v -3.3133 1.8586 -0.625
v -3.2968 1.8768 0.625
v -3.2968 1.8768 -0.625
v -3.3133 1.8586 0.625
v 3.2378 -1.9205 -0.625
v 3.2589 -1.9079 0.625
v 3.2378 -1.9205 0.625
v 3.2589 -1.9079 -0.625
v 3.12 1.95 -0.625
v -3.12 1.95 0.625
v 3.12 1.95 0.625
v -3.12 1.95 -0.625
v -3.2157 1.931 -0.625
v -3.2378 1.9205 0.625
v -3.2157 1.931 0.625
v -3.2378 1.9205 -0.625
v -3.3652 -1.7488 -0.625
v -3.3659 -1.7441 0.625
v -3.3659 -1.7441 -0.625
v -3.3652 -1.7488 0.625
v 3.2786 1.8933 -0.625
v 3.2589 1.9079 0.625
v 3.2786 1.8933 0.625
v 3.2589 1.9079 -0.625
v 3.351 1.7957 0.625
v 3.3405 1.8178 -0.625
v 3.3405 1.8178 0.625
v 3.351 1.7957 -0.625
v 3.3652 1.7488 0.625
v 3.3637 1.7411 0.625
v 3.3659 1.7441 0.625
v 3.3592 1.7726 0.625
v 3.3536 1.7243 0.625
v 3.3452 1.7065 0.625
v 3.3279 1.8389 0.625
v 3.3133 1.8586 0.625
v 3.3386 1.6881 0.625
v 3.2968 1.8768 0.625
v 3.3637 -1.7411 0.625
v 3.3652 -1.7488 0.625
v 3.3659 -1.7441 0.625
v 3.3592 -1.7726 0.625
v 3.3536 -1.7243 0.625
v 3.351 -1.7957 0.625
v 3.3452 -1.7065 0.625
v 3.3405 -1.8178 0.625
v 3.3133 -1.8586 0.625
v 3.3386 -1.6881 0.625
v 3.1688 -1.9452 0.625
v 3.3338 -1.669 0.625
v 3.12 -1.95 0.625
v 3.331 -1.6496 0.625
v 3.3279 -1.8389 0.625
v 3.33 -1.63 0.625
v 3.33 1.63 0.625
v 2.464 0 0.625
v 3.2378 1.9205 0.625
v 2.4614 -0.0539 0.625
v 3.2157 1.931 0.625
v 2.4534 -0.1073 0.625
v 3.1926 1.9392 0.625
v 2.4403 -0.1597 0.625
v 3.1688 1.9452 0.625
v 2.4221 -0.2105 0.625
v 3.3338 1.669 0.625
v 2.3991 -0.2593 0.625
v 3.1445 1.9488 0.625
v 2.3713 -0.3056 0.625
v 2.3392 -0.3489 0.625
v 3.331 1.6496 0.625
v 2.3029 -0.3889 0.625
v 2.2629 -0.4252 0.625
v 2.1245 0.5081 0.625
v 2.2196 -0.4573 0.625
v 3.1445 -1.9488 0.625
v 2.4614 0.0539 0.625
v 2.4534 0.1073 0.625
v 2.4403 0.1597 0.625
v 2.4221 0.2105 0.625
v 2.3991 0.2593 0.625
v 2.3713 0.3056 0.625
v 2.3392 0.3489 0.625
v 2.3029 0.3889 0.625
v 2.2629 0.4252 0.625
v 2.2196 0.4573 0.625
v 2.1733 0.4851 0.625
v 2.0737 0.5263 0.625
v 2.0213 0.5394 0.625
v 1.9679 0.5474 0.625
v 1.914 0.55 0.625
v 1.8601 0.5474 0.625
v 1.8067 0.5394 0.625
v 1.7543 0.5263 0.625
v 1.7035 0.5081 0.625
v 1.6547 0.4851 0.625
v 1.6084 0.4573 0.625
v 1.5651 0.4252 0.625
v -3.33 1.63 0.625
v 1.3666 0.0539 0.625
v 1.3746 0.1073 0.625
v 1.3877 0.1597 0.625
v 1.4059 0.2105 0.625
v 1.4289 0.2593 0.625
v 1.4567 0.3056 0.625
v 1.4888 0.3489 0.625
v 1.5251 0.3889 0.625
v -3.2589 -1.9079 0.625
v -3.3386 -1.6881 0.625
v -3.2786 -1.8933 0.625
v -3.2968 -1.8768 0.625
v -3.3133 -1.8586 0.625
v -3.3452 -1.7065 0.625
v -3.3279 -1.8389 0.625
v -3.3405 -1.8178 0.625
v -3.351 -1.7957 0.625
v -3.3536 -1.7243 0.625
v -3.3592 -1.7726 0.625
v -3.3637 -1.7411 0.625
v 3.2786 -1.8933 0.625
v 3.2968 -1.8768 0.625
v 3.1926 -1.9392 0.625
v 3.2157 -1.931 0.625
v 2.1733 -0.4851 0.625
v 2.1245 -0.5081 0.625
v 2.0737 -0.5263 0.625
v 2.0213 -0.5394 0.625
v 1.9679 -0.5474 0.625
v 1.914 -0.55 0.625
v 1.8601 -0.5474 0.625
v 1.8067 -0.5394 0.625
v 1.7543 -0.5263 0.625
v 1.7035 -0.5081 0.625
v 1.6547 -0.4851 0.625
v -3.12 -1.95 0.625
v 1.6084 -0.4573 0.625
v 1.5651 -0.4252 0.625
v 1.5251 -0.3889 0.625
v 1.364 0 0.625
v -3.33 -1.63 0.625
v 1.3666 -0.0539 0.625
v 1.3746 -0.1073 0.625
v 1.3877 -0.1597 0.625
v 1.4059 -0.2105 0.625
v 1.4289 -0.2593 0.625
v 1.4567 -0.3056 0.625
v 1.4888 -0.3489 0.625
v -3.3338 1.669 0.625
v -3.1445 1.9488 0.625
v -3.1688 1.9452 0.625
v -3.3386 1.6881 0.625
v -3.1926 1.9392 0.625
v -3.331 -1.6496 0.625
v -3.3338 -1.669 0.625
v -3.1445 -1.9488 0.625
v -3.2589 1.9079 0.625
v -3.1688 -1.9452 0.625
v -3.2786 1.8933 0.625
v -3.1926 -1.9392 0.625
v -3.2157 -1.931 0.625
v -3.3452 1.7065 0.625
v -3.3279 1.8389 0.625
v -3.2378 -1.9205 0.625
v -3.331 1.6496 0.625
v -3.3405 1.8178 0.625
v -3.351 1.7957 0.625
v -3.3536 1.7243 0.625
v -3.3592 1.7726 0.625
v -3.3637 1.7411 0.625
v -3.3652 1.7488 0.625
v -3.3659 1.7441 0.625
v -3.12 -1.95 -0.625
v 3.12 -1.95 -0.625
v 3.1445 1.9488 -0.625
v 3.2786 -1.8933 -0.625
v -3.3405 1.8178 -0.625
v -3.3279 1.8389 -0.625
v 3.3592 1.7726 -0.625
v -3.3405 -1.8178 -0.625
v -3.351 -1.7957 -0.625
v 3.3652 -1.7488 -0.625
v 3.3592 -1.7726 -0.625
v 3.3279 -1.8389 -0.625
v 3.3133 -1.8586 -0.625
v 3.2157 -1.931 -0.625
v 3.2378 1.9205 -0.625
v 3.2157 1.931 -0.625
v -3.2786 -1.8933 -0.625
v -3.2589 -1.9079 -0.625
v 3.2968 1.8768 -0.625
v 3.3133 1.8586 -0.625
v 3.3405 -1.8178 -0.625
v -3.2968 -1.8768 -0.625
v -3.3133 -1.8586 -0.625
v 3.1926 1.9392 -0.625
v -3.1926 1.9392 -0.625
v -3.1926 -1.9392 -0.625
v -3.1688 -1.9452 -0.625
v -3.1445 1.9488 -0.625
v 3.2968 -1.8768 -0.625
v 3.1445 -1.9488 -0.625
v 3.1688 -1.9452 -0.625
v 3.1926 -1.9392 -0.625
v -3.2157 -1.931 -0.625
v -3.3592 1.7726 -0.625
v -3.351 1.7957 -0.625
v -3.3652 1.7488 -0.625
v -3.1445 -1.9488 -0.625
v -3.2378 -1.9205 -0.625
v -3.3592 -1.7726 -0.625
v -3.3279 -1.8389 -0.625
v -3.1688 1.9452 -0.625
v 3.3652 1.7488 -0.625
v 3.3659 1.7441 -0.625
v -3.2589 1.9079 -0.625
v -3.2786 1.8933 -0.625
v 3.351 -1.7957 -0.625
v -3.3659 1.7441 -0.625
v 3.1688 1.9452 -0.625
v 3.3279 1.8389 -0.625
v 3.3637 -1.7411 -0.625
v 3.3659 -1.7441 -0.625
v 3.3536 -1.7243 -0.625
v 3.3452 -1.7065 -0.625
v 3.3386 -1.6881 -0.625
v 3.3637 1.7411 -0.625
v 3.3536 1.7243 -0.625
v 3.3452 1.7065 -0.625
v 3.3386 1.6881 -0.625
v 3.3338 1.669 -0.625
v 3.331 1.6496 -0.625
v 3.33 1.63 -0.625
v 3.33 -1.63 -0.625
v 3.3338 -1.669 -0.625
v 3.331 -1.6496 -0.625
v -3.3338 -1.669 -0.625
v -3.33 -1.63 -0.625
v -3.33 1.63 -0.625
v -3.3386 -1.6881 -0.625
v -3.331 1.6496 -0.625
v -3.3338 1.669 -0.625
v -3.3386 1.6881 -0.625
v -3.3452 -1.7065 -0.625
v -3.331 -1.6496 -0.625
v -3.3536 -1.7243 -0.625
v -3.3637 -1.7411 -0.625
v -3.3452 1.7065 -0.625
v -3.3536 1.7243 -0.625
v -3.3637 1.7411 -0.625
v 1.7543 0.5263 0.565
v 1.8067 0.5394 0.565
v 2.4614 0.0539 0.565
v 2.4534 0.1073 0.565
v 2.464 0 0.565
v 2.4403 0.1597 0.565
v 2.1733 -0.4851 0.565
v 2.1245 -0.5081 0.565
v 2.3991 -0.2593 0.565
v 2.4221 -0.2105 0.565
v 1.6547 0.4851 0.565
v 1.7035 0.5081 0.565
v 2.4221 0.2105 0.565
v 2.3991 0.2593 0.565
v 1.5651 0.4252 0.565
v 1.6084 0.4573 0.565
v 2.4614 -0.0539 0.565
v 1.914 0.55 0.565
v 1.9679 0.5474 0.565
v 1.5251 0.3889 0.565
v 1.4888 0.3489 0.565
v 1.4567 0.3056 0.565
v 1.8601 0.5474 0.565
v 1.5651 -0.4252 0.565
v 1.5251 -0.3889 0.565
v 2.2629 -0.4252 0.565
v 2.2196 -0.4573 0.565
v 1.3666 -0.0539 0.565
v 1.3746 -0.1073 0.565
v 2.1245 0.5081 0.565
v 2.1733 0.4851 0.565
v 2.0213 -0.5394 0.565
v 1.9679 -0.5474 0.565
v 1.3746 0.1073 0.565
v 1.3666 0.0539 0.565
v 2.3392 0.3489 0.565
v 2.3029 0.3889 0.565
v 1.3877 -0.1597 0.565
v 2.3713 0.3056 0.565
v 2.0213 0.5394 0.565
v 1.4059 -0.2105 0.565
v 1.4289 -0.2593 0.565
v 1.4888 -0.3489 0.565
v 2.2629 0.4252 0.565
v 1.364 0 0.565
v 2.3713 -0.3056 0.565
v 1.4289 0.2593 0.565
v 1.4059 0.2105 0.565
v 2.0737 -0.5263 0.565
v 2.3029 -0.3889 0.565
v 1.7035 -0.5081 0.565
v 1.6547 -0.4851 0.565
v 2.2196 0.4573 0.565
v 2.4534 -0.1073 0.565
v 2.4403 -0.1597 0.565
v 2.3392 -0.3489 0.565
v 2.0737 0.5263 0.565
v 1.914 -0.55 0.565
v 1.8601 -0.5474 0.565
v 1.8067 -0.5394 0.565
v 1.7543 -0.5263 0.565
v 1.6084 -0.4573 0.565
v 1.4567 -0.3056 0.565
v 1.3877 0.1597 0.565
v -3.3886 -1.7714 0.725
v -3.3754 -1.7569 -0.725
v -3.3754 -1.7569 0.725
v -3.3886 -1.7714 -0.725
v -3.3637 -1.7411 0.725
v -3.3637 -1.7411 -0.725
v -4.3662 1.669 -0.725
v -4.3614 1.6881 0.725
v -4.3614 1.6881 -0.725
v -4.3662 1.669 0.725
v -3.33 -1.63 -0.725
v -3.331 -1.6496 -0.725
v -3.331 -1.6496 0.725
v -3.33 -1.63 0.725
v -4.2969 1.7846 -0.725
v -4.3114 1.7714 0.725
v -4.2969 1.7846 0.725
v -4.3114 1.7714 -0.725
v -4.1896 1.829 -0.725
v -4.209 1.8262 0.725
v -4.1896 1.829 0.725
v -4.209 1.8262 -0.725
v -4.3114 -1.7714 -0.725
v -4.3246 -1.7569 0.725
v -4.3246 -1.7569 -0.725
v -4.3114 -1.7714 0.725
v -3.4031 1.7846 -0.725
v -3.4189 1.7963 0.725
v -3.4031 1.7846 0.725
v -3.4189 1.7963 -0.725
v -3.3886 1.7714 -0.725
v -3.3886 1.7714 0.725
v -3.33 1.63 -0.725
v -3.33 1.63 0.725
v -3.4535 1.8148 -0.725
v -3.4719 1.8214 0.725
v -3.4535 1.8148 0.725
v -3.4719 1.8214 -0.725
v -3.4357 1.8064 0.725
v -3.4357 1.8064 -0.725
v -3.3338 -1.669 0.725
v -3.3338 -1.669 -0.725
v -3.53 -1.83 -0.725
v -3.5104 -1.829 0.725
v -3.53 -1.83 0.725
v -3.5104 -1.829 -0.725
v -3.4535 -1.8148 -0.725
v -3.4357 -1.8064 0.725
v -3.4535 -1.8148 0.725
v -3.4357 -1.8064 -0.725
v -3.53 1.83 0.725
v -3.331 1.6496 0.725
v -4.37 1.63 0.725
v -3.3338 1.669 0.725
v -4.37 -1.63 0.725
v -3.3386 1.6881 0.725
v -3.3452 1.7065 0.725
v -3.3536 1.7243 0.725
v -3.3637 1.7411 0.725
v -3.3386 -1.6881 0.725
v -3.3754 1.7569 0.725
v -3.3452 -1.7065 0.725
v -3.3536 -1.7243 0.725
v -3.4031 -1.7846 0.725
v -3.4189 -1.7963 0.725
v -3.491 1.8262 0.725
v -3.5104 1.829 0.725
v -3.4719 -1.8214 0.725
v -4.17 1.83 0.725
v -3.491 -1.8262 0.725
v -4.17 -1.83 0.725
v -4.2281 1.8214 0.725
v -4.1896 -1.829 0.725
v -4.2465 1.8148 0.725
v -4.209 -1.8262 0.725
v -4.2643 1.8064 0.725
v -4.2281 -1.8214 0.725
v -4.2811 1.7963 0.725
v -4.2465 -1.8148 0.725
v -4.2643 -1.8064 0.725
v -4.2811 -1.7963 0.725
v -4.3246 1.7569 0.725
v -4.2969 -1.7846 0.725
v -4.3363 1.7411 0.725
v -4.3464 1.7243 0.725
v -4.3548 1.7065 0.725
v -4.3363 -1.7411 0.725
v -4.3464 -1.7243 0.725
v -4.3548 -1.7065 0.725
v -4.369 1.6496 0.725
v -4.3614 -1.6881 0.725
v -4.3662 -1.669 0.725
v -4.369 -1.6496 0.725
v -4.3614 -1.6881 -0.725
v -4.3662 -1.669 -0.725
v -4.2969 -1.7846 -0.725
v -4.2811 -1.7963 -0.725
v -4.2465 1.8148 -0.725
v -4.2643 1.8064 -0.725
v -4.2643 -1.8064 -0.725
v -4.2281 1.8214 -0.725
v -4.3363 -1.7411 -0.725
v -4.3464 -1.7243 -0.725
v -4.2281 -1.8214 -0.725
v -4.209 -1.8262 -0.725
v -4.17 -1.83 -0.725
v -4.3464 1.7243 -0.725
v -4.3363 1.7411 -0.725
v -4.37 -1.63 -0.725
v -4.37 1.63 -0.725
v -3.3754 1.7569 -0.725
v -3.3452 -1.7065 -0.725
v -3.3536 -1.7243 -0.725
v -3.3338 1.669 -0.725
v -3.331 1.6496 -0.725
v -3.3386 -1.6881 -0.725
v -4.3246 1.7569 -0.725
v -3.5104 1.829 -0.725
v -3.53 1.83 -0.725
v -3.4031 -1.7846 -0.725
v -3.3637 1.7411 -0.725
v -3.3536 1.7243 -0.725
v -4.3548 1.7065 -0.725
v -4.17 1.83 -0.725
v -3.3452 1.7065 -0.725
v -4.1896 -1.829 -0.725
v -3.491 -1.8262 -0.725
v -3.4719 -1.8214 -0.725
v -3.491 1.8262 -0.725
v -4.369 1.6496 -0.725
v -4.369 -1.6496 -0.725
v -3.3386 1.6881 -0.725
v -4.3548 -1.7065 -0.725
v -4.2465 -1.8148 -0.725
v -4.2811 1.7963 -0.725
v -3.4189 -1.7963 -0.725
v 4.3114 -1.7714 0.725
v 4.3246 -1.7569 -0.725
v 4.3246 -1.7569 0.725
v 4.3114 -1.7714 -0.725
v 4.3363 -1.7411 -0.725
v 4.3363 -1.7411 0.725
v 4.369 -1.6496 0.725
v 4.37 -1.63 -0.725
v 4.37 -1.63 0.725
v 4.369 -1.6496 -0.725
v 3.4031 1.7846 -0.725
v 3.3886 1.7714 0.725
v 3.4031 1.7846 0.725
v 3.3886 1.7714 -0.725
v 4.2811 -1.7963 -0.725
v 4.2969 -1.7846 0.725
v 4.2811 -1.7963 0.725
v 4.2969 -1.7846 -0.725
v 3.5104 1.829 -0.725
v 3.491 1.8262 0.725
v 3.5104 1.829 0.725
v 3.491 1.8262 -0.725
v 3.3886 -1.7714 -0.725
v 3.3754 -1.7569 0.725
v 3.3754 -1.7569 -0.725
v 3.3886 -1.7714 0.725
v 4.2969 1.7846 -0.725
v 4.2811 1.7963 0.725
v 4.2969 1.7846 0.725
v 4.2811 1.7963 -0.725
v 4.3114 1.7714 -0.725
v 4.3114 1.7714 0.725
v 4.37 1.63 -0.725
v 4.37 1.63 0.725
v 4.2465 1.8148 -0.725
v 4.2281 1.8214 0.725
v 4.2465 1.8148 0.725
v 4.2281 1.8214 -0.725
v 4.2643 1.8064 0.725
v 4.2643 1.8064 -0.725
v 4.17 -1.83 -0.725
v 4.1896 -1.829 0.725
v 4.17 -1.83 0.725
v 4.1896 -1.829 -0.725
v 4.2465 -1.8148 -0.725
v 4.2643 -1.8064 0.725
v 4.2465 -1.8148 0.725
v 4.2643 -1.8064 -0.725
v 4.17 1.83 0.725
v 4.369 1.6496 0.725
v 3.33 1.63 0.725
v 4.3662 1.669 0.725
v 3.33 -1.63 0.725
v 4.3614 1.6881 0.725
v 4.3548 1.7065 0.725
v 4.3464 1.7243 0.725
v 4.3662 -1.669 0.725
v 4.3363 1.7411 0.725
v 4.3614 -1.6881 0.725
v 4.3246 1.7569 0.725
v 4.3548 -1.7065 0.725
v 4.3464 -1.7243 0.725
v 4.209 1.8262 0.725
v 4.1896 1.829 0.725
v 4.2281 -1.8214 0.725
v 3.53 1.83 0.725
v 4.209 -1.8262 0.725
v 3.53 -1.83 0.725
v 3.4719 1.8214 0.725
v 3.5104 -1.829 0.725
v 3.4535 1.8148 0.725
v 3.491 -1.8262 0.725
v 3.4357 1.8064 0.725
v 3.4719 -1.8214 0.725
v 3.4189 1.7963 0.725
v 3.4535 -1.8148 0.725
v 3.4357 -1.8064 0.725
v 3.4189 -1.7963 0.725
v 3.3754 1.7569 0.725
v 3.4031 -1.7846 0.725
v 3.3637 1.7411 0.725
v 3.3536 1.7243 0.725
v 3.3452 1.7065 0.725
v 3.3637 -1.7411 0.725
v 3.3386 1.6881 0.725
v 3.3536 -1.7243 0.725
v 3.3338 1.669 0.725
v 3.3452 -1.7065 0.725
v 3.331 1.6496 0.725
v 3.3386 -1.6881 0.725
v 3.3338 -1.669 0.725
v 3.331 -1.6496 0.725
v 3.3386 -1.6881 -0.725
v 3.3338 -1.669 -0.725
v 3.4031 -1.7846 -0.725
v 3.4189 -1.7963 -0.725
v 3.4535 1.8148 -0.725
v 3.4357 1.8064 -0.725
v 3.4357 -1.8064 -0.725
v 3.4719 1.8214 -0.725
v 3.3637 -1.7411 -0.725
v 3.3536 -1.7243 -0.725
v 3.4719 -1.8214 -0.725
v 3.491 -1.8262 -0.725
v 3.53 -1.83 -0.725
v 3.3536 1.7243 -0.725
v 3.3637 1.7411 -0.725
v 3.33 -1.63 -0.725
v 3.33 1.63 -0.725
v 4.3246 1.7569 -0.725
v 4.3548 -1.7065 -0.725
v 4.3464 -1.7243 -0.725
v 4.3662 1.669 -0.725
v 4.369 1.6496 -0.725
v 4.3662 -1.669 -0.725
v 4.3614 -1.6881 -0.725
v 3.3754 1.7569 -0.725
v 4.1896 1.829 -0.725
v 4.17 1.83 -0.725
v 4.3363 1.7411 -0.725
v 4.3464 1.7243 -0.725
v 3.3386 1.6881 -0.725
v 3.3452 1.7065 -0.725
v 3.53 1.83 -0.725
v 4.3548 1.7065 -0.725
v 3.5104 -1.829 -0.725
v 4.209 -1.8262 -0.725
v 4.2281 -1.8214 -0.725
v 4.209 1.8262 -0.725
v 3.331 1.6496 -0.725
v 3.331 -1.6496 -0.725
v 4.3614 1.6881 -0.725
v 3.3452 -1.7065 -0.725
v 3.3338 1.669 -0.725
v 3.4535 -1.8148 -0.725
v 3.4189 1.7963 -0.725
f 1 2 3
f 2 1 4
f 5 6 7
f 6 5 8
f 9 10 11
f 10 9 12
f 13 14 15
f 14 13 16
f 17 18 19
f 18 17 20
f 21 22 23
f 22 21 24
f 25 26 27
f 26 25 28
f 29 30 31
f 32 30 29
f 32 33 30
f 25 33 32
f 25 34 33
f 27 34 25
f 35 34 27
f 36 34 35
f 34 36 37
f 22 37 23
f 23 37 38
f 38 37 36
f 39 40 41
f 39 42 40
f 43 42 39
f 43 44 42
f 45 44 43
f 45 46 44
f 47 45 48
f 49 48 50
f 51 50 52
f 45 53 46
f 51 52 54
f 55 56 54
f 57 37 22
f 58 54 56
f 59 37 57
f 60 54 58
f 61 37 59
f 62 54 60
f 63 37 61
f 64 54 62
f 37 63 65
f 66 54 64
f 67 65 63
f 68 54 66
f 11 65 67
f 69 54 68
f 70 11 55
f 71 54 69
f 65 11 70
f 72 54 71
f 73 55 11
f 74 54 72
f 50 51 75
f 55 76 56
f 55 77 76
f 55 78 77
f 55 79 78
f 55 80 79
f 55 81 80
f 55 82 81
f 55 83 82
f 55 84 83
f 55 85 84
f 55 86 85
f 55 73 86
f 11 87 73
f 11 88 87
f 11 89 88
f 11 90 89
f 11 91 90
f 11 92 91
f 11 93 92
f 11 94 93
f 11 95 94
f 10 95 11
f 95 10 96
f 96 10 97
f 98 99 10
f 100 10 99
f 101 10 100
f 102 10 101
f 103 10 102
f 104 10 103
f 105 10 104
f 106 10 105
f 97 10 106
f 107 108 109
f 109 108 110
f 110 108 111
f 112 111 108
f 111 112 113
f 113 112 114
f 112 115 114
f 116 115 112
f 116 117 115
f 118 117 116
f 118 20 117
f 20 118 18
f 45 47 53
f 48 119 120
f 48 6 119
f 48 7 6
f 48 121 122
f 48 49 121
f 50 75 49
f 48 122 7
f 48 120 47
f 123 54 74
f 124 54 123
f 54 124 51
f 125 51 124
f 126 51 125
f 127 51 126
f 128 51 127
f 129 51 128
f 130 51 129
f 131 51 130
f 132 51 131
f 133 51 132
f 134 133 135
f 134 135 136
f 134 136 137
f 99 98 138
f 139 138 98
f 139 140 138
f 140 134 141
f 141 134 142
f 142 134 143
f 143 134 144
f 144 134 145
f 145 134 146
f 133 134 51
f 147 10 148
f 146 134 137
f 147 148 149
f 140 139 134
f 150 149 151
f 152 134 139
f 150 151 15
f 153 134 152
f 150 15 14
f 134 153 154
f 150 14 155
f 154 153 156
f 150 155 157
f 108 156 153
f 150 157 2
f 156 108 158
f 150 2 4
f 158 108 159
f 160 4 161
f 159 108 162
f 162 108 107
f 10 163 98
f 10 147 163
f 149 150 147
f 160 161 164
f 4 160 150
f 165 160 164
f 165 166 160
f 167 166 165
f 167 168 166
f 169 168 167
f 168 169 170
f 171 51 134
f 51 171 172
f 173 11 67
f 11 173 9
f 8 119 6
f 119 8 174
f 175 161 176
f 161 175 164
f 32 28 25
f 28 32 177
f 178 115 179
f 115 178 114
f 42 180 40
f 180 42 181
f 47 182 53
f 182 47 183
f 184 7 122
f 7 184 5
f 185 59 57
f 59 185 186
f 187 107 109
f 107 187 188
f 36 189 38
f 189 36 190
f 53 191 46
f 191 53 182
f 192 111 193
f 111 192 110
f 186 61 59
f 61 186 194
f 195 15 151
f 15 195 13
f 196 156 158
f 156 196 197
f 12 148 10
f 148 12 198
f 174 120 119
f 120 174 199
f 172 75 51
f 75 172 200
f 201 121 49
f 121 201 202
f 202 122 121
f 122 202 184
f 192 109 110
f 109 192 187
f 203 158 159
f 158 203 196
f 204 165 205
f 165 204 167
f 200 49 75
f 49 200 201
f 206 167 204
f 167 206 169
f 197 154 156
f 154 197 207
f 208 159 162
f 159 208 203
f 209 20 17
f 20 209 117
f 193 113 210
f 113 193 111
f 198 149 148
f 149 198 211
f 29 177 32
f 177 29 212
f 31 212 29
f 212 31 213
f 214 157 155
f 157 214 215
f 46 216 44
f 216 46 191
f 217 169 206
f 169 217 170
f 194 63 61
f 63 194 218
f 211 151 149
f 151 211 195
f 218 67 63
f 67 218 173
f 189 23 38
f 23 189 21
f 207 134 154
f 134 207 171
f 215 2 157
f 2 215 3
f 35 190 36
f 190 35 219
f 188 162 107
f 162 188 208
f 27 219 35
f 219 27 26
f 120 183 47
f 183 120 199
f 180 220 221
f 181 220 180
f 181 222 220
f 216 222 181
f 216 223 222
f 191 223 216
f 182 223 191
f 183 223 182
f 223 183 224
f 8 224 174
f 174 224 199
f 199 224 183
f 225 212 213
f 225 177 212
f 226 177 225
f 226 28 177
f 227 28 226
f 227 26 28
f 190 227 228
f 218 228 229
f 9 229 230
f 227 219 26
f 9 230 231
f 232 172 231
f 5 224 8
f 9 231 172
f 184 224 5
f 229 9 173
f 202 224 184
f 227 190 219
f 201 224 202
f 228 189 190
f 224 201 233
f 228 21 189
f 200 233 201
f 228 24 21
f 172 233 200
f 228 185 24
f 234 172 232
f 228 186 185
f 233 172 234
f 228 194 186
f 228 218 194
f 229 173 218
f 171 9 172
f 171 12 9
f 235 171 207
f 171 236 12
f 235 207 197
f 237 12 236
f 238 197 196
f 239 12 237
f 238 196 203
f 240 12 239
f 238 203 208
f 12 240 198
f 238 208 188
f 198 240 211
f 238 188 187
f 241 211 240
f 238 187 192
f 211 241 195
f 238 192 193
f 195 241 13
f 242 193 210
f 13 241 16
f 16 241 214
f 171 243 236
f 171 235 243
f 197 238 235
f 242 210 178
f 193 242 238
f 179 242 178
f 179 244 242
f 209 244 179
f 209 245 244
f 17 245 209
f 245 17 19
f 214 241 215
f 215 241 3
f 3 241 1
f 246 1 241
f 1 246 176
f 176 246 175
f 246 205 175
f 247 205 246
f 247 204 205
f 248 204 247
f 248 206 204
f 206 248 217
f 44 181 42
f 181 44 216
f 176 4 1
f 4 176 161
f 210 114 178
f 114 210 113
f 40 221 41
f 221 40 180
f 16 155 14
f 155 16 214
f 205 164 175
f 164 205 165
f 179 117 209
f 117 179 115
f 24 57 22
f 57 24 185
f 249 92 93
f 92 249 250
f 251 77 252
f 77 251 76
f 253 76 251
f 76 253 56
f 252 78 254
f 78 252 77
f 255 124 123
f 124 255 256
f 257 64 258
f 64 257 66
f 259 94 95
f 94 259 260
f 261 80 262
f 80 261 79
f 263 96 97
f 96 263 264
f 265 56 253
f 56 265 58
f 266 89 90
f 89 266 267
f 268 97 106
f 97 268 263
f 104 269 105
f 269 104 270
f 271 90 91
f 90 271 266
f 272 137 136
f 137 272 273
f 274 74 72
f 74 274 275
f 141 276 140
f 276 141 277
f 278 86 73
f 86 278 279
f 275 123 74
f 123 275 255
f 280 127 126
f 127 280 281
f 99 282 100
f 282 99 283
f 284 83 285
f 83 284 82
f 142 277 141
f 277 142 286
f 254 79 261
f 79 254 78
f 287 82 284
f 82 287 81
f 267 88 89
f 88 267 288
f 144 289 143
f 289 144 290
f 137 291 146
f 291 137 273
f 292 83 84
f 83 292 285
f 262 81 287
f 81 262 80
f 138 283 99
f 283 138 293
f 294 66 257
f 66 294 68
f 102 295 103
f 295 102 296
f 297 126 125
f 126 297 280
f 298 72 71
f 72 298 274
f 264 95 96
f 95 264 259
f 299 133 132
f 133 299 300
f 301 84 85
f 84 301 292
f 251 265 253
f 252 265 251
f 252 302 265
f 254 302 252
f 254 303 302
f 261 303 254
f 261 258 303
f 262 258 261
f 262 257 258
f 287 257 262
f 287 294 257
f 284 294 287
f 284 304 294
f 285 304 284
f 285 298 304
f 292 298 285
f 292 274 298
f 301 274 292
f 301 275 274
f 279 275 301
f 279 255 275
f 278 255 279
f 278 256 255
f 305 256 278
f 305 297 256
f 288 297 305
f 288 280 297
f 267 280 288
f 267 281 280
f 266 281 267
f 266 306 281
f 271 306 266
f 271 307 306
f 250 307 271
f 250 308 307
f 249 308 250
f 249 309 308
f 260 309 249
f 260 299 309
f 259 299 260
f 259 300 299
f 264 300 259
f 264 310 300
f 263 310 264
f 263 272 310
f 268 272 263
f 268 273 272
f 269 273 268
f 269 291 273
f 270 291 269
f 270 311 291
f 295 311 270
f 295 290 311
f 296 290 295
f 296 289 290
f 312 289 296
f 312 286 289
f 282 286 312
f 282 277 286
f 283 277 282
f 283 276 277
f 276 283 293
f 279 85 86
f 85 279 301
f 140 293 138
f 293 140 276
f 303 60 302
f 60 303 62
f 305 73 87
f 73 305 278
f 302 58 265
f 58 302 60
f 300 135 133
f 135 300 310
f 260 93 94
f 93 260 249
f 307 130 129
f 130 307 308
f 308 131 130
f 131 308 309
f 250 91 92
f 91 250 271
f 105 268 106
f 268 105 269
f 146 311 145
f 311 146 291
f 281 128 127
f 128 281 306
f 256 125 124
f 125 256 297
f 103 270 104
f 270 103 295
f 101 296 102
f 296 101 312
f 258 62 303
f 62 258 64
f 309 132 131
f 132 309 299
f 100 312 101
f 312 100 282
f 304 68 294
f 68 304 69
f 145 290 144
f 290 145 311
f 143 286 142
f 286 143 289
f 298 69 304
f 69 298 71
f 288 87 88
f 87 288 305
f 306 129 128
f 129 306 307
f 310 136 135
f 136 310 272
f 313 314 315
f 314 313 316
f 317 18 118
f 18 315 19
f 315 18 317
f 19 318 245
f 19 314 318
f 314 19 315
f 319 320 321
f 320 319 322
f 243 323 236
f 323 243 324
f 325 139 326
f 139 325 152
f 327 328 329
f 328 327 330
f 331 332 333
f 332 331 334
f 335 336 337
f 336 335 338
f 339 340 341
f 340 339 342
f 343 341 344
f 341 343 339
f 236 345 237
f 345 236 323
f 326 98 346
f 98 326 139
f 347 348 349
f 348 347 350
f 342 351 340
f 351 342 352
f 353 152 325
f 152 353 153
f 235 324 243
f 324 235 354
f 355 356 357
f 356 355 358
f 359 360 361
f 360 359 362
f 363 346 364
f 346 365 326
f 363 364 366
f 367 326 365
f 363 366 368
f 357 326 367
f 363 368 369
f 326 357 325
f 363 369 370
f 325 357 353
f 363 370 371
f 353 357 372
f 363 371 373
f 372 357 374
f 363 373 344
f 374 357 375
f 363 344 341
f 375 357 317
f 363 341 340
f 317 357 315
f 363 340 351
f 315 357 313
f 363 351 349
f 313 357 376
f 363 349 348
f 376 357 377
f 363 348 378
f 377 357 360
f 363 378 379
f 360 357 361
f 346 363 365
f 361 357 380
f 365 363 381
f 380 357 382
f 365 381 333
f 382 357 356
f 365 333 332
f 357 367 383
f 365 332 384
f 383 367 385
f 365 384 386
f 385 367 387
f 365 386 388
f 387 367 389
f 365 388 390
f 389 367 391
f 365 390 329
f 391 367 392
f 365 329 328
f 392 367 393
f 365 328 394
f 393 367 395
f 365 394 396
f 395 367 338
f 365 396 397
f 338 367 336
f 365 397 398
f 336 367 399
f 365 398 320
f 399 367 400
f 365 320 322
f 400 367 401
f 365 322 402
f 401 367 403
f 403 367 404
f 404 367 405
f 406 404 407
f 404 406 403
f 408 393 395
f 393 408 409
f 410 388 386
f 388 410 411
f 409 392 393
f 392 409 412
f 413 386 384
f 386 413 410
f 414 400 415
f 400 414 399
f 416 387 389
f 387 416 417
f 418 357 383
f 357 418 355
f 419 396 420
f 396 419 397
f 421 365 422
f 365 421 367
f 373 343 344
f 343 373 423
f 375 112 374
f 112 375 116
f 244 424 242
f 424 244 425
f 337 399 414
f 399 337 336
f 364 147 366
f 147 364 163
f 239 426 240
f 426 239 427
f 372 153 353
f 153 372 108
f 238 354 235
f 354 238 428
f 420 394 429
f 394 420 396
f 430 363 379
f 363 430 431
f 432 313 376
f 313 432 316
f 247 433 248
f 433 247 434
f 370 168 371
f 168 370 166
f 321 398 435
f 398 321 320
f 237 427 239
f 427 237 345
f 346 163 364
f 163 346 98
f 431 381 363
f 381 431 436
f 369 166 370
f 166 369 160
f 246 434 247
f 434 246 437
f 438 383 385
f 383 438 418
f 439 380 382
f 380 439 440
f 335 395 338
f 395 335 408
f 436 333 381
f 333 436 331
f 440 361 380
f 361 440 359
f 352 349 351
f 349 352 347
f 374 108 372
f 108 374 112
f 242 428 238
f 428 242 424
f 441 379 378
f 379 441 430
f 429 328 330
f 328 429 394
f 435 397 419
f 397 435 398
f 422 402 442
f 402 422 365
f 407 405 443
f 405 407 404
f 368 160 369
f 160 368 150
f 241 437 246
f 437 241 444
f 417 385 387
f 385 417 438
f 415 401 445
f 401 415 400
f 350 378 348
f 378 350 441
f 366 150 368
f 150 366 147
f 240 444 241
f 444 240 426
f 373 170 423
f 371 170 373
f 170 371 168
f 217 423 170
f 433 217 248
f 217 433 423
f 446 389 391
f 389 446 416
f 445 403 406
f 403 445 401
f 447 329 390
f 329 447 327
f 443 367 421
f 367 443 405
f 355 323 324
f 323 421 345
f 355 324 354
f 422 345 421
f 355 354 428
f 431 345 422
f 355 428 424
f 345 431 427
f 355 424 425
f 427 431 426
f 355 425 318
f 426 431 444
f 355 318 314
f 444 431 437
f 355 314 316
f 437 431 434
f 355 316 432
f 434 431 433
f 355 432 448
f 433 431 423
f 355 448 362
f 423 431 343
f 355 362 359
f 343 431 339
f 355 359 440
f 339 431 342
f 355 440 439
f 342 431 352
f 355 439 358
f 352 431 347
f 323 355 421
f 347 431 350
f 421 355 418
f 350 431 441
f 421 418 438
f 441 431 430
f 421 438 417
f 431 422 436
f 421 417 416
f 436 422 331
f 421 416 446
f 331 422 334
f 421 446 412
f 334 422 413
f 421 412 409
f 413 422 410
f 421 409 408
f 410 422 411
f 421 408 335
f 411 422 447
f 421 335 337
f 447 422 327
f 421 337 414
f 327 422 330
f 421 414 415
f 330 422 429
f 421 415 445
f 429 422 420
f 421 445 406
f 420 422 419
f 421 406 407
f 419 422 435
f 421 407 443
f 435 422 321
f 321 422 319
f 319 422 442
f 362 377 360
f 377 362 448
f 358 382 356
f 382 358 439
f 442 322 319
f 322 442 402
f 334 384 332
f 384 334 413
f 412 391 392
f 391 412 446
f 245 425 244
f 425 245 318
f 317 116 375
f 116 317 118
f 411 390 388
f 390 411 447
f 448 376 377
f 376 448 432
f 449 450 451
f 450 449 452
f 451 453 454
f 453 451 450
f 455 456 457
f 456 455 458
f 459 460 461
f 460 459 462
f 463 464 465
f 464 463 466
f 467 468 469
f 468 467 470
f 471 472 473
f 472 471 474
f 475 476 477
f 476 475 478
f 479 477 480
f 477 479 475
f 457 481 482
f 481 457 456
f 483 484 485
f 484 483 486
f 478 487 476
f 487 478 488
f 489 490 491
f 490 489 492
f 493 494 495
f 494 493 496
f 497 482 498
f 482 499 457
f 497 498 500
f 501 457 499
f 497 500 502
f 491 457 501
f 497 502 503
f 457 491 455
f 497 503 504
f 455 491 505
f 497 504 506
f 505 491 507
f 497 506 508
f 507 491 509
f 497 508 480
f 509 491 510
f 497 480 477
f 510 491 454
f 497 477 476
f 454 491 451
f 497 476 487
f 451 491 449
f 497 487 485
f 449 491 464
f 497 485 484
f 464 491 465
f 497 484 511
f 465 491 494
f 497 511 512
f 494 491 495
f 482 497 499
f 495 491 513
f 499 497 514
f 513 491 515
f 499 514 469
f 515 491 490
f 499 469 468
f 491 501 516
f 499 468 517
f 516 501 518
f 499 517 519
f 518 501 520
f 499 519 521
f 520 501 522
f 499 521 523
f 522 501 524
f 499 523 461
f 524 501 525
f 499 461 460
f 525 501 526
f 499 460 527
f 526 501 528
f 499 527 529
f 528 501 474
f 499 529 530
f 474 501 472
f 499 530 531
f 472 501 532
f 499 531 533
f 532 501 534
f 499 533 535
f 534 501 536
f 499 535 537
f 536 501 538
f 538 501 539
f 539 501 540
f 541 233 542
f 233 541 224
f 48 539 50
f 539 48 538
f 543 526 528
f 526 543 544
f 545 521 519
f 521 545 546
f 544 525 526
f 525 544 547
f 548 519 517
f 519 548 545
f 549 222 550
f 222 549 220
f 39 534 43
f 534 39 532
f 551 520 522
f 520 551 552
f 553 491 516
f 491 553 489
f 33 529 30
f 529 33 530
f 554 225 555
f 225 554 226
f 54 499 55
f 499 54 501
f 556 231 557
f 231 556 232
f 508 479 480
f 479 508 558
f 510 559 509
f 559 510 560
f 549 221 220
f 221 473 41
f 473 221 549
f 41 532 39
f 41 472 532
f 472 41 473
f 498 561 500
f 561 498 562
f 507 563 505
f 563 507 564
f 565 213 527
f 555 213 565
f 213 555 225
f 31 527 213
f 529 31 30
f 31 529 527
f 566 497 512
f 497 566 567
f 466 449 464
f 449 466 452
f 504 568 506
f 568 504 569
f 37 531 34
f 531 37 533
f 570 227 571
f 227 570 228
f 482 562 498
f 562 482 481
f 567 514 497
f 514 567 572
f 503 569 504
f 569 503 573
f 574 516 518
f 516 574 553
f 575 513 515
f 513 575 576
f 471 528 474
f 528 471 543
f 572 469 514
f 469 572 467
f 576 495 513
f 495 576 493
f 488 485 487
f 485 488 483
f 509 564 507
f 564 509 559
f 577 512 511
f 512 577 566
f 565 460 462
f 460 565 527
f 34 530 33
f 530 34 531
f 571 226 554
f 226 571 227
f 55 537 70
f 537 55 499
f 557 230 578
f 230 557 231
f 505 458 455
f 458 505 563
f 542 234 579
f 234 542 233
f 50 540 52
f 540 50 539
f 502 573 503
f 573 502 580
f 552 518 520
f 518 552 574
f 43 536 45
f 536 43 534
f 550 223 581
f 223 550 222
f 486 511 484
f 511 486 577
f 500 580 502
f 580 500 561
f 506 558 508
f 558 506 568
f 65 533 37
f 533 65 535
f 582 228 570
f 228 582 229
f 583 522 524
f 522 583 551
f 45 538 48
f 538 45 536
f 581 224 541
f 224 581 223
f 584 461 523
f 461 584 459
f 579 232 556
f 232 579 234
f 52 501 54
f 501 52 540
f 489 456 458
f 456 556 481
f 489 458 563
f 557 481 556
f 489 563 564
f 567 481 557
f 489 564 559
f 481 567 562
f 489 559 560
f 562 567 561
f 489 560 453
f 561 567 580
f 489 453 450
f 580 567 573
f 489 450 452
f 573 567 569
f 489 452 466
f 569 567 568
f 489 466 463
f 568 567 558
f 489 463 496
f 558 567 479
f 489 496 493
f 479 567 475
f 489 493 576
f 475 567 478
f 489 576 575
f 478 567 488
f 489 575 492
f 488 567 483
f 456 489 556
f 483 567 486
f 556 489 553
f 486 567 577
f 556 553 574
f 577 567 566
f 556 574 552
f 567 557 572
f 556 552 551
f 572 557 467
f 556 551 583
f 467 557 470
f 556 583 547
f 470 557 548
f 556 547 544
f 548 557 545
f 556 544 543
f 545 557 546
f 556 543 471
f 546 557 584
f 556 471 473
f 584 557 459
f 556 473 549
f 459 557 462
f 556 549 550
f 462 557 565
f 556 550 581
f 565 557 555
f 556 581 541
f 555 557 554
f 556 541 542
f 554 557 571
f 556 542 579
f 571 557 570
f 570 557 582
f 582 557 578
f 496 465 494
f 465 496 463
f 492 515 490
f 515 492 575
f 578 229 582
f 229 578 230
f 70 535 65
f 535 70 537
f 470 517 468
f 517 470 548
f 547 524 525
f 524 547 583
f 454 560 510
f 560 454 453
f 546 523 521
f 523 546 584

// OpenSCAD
// SMD package: overall dimensions [8.70, 3.90, 1.25] (L, W, H)
// One connected solid with visible end terminations and a shallow top marking.

$fn = 64;

// Overall dimensions (mm)
L = 8.70;
W = 3.90;
H = 1.25;

// Small epsilon overlap to guarantee manifold unions/differences
eps = 0.02;

// Body edge rounding (kept modest so it still looks like a typical molded SMD)
edge_r = min(0.25, W*0.08, H*0.25);

// Termination geometry (end caps)
term_len = min(1.00, L*0.14);     // length of metal cap along L
term_inset = min(0.12, W*0.05);   // inset from side edges
term_thk = min(0.10, H*0.10);     // slight protrusion beyond body height for visibility

// Top marking (shallow recess)
mark_depth = min(0.06, H*0.06);
mark_r = min(0.55, W*0.18);
mark_x = L*0.22;                  // offset along length

// Rounded rectangular prism via hull of corner cylinders
module rounded_box(l, w, h, r) {
    r2 = min(r, l/2 - 0.001, w/2 - 0.001);
    hull() {
        for (sx = [-1, 1], sy = [-1, 1])
            translate([sx*(l/2 - r2), sy*(w/2 - r2), 0])
                cylinder(r=r2, h=h, center=true);
    }
}

// Main molded body (slightly shorter than overall length to leave room for end caps)
module body() {
    body_l = L - 2*term_len + 2*eps; // ensures caps overlap into body
    difference() {
        rounded_box(body_l, W, H, edge_r);

        // Recessed circular mark on top surface (connected; subtracts from body)
        translate([mark_x, 0, H/2 - mark_depth/2 + eps])
            cylinder(r=mark_r, h=mark_depth + 2*eps, center=true);
    }
}

// End terminations (metal caps) - connected with overlap into body
module terminations() {
    term_w = W - 2*term_inset;
    term_h = H + 2*term_thk; // protrude slightly above/below body
    cap_r = min(edge_r*0.8, term_len*0.25, term_w*0.25);

    for (sx = [-1, 1]) {
        // Place each cap so its outer face is at +/- L/2, with slight overlap into body
        translate([sx*(L/2 - term_len/2), 0, 0])
            rounded_box(term_len + 2*eps, term_w, term_h, cap_r);
    }
}

// Assemble as ONE connected solid with correct overall envelope L x W x H (caps may protrude slightly in Z only)
union() {
    body();
    terminations();
}
